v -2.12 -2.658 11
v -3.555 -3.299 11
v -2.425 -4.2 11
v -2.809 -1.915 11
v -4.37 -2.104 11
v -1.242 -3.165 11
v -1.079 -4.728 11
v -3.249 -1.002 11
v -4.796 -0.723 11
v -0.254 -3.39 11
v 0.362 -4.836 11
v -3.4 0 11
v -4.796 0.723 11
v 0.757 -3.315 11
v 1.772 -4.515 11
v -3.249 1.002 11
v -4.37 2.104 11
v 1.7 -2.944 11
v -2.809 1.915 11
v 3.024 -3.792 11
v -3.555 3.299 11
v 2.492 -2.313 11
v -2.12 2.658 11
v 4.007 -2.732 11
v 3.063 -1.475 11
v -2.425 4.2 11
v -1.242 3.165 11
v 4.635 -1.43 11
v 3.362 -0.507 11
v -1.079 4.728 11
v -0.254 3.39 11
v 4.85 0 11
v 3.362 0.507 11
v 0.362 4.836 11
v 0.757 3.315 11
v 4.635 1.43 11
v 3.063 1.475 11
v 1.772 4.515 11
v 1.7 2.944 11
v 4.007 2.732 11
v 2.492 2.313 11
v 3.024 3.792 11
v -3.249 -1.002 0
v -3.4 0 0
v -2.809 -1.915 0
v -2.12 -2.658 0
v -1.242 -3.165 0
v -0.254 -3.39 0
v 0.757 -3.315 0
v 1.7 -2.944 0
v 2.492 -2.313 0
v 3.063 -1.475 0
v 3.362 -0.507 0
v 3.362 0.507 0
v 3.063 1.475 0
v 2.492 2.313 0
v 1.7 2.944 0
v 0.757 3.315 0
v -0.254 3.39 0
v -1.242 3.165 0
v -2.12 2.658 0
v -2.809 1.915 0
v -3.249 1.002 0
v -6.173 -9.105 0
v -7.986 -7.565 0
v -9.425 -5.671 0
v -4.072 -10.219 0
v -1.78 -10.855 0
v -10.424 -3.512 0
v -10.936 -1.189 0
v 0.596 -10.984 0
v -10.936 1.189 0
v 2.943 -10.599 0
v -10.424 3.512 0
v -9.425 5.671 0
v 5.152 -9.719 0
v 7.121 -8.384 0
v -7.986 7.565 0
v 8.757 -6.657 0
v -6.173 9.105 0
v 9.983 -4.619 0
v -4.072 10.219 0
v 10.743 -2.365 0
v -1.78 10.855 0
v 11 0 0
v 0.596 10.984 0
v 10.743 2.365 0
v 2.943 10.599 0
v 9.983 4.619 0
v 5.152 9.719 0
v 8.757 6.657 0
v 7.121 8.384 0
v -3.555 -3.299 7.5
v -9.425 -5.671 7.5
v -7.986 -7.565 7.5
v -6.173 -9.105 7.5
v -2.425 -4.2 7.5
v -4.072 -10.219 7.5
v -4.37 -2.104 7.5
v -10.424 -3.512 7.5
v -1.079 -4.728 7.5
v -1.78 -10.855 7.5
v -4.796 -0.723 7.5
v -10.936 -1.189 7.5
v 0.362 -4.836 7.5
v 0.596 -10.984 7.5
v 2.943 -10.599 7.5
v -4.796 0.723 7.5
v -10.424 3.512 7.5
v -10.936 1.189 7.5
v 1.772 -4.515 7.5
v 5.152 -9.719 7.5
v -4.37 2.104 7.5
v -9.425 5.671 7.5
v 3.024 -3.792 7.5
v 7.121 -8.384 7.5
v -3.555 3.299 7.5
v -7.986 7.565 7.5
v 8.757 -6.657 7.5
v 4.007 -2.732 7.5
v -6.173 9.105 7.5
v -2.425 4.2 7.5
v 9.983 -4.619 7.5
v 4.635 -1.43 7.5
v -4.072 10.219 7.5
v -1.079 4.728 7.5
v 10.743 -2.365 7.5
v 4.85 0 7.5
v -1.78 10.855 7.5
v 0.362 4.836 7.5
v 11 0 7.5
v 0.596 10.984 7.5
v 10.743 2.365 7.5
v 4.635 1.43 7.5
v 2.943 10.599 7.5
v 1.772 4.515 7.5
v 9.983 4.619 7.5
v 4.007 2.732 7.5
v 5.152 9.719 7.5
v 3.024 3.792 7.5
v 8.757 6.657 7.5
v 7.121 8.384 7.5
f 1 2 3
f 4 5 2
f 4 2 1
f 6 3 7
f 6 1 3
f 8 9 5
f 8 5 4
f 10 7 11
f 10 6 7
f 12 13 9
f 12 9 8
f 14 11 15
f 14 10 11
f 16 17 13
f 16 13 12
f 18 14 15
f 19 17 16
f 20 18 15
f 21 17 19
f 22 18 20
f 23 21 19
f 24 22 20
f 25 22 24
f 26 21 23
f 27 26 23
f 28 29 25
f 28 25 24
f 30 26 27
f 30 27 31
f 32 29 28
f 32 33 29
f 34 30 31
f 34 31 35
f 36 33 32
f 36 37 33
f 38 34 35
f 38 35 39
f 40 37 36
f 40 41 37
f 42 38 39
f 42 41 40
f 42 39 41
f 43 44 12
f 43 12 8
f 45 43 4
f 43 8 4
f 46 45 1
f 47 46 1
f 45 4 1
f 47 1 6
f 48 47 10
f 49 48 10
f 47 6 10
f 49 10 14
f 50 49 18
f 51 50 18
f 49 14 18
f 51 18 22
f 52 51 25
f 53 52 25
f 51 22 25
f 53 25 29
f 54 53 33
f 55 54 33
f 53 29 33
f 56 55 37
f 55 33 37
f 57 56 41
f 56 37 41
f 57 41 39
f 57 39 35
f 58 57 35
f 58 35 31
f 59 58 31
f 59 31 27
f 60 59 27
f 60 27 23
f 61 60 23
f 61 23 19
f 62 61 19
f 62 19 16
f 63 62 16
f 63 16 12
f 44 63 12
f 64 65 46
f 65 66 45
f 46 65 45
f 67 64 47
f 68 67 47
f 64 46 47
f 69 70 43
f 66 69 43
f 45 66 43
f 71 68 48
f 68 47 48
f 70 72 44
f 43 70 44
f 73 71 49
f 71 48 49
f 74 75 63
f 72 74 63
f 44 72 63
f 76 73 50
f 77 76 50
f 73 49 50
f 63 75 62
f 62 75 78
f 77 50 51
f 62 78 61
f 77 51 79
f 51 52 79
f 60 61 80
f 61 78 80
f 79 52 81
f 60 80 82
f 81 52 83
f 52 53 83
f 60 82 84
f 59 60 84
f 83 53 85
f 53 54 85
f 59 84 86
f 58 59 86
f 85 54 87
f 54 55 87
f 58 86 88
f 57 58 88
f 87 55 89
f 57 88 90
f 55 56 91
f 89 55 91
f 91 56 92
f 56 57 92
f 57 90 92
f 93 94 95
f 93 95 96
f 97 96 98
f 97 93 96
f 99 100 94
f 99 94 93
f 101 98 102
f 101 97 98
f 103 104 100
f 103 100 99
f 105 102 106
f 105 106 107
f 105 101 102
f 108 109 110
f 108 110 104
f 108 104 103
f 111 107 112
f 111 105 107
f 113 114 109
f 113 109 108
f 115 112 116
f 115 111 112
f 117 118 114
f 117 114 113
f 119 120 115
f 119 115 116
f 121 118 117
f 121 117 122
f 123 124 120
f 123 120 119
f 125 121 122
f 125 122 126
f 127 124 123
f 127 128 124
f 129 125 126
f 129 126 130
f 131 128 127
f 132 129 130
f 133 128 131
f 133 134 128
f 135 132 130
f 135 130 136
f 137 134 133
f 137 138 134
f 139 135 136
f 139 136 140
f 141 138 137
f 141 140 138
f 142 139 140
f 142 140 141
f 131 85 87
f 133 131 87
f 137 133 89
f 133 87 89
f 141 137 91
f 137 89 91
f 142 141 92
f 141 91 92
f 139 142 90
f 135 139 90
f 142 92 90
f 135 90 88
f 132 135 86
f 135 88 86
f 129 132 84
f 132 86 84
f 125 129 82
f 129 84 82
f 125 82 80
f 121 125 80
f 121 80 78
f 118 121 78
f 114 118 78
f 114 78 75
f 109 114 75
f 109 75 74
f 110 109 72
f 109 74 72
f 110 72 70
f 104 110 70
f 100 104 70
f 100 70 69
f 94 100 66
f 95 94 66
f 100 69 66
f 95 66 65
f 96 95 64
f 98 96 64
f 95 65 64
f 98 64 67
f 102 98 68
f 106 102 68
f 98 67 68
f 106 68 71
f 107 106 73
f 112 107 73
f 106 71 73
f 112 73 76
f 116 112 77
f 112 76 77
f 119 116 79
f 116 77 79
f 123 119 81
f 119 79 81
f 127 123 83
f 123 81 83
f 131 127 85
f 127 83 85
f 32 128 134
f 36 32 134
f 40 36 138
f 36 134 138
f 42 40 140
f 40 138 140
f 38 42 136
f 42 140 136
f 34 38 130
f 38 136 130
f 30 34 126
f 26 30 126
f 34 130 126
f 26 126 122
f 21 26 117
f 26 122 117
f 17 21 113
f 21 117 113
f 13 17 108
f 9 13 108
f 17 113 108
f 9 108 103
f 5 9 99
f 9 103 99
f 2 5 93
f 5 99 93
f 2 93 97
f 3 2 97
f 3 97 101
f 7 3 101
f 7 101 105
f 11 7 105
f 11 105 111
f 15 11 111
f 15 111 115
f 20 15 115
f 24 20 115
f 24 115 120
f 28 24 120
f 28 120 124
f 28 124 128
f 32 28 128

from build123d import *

# Parameters (mm, degrees)
F0_R     = 11
F0_R_2   = 4.85
F1_DEPTH = 7.5
F2_DEPTH = 11
F3_D     = 6.8


with BuildPart() as f1:
    # F0 (on Top) → F1 (new body)
    with BuildSketch(Plane.XY):
        Circle(F0_R)
        Circle(F0_R_2, mode=Mode.SUBTRACT)
        Circle(F0_R_2)
    extrude(amount=F1_DEPTH)

    # F0 (on Top) → F2 (join)
    with BuildSketch(Plane.XY):
        Circle(F0_R_2)
    extrude(amount=F2_DEPTH)

    # F3 (through all)
    with Locations(Plane(origin=(0, 0, 0), x_dir=(1, 0, 0), z_dir=(0, 0, -1))):
        with Locations((0, 0)):
            Hole(F3_D / 2)


solid = f1.part
